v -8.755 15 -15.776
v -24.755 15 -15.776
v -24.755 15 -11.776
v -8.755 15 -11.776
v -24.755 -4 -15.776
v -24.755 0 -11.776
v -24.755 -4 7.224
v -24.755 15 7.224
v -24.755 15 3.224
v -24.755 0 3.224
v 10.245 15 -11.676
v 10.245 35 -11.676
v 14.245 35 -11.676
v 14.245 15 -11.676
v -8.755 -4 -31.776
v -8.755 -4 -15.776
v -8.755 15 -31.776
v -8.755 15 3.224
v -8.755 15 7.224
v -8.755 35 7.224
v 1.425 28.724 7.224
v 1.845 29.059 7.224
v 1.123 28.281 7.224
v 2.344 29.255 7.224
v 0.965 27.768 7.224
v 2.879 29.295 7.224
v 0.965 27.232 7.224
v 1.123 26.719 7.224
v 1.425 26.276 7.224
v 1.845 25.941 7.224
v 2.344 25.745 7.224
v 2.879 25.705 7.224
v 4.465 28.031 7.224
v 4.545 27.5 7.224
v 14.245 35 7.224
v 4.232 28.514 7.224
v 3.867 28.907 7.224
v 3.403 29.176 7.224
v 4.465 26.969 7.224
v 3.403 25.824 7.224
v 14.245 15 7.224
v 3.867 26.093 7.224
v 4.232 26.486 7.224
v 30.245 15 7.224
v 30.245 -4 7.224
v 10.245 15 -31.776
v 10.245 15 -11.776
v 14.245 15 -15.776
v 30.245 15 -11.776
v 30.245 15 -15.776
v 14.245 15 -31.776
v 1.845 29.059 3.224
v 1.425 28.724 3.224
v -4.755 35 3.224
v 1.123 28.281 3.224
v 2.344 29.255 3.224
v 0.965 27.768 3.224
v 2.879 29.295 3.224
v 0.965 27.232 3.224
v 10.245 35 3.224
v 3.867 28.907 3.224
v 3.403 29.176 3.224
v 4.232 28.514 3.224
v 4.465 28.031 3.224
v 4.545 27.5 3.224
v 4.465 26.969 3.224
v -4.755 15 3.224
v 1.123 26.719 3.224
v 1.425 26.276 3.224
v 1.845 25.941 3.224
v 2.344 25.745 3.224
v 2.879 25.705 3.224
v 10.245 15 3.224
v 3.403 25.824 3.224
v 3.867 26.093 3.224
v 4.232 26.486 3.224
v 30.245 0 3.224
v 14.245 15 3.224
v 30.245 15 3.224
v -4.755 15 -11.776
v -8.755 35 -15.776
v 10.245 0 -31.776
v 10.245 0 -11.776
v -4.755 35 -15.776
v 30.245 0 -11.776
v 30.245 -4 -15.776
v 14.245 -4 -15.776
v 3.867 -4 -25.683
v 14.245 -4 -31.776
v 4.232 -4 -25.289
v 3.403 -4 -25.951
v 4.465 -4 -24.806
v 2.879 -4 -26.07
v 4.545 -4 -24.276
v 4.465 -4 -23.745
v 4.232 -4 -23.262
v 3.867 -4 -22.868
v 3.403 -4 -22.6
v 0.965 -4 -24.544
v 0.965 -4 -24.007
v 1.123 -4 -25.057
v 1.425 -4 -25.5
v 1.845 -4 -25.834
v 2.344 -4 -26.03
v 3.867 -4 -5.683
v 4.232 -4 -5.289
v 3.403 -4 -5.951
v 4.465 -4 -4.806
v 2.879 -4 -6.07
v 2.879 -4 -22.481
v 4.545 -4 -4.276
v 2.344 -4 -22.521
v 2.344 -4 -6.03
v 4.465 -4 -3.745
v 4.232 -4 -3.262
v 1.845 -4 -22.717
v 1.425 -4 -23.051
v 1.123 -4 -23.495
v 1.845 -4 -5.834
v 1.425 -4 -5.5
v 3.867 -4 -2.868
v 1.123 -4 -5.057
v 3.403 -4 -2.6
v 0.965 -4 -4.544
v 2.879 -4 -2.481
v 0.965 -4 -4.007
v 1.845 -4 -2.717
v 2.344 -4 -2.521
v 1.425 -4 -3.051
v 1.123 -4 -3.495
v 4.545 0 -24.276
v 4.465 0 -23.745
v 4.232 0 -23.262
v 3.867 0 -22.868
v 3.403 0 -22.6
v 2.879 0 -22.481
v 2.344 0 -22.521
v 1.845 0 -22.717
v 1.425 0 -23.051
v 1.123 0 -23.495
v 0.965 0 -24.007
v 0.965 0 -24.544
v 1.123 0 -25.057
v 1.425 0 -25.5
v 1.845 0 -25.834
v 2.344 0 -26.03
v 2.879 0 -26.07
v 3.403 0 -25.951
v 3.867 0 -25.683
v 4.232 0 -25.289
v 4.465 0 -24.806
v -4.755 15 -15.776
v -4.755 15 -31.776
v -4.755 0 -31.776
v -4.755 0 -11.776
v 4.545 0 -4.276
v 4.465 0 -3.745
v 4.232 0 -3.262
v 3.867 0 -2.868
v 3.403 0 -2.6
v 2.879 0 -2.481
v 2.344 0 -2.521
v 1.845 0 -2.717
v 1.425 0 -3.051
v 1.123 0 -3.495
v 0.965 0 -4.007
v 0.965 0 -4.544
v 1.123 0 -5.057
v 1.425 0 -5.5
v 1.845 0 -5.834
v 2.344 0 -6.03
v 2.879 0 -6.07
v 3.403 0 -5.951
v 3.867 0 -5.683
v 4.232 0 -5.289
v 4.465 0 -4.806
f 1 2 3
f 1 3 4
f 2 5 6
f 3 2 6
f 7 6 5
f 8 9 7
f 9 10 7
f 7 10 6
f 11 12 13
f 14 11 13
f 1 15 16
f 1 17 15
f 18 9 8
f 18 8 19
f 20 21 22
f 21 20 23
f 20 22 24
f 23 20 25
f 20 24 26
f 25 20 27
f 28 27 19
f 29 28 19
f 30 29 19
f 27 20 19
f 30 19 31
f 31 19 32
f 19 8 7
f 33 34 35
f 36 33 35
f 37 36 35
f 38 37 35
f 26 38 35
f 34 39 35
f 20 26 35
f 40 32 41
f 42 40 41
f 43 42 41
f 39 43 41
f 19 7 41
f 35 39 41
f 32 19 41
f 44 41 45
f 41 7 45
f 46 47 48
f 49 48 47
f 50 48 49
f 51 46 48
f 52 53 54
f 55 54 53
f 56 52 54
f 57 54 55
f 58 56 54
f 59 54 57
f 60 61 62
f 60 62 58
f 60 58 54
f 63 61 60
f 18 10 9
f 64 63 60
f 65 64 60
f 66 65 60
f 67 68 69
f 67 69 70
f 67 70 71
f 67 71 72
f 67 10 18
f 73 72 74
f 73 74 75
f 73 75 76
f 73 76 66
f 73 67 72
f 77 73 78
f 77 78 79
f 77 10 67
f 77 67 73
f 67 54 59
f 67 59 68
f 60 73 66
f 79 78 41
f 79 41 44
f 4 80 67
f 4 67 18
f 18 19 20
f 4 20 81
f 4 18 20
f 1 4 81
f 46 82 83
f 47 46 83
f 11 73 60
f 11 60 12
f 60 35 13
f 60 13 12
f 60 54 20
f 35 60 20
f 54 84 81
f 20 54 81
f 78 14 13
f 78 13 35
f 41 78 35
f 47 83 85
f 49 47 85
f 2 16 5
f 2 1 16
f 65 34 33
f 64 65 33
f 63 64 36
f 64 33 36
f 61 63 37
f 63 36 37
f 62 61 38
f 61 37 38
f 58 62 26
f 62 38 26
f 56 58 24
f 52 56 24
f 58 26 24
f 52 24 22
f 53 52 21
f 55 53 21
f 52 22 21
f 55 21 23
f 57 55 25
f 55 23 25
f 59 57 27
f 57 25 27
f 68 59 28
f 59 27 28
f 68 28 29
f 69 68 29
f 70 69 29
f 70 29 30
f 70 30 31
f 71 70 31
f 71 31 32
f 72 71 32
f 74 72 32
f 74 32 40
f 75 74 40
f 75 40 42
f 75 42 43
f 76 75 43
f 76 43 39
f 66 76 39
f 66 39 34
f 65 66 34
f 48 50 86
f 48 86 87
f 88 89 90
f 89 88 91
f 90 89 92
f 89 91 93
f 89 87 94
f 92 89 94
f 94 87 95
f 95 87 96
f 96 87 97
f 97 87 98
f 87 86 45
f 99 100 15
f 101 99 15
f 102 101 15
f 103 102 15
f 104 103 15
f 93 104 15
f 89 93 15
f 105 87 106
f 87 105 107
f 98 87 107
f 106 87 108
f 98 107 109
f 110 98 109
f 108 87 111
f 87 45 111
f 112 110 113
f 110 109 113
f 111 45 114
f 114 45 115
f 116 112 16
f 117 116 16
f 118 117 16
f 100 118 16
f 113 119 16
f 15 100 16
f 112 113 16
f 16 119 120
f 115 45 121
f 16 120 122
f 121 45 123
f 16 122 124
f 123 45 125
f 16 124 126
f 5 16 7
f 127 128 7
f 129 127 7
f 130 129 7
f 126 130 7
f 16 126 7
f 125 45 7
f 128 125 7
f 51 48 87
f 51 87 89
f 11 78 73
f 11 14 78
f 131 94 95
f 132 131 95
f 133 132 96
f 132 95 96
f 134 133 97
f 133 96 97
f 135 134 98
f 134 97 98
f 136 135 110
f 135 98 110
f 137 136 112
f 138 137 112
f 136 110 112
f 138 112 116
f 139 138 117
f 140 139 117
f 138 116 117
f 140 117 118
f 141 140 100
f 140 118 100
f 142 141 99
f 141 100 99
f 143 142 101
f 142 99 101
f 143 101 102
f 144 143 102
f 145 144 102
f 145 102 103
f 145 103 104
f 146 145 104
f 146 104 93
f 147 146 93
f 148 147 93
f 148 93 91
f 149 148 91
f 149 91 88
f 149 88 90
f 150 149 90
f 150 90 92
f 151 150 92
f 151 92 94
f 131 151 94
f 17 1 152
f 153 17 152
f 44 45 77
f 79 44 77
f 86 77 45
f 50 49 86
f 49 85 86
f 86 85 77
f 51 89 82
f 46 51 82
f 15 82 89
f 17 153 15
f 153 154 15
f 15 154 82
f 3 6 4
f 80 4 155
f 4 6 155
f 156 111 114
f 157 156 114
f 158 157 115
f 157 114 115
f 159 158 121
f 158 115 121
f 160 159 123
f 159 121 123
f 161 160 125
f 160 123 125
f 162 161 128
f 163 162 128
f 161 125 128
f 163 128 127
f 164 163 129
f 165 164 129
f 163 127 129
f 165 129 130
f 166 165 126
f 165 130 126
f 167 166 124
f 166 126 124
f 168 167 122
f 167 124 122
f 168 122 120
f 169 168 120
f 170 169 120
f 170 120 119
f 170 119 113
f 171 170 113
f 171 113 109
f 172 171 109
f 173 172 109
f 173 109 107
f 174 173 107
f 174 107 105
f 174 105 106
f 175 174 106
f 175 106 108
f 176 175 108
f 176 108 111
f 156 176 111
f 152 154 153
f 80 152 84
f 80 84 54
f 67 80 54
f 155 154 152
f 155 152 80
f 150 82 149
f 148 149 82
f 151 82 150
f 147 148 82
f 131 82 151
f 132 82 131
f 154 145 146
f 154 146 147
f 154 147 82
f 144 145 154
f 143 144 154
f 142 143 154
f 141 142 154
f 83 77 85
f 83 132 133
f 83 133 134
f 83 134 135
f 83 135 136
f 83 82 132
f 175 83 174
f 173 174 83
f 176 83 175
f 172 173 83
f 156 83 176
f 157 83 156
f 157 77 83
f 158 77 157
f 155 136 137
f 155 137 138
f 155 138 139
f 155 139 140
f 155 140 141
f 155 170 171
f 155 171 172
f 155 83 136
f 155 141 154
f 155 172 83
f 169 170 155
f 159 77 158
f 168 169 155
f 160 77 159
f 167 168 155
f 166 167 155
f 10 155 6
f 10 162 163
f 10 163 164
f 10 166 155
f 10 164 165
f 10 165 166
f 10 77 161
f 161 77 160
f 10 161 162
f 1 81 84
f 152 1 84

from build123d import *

# Parameters (mm, degrees)
EXTRUDE_1_DEPTH     = 15
EXTRUDE_1_2_DEPTH   = 15
SKETCH_1_W          = 55
SKETCH_1_H          = 4
EXTRUDE_1_3_DEPTH   = 15
EXTRUDE_2_DEPTH     = 4
EXTRUDE_3_DEPTH     = 20
SKETCH_4_R          = 1.8
CUT_EXTRUDE_1_DEPTH = 20
SKETCH_5_R          = 1.8
CUT_EXTRUDE_2_DEPTH = 20


with BuildPart() as part:
    # 草图1 → 凸台-拉伸1 (new body)
    with BuildSketch(Plane(origin=(0, 0, 0), x_dir=(1, 0, 0), z_dir=(0, 1, 0))):
        Polygon((-24.755102041, 11.775510204), (-4.755102041, 11.775510204), (-4.755102041, 31.775510204), (-8.755102041, 31.775510204), (-8.755102041, 15.775510204), (-24.755102041, 15.775510204), align=None)
    extrude(amount=EXTRUDE_1_DEPTH)



with BuildPart() as body_2:
    # 草图1 → Extrude 1 2 (new body)
    with BuildSketch(Plane(origin=(0, 0, 0), x_dir=(1, 0, 0), z_dir=(0, 1, 0))):
        Polygon((30.244897959, 15.775510204), (14.244897959, 15.775510204), (14.244897959, 31.775510204), (10.244897959, 31.775510204), (10.244897959, 11.775510204), (12.244897959, 11.775510204), (30.244897959, 11.775510204), align=None)
    extrude(amount=EXTRUDE_1_2_DEPTH)


with BuildPart() as body_3:
    # 草图1 → Extrude 1 3 (new body)
    with BuildSketch(Plane(origin=(0, 0, 0), x_dir=(1, 0, 0), z_dir=(0, 1, 0))):
        with Locations((2.744897959, -5.224489796)):
            Rectangle(SKETCH_1_W, SKETCH_1_H)
    extrude(amount=EXTRUDE_1_3_DEPTH)


with BuildPart() as part_1:
    add(part.part)

    add(body_2.part)  # 凸台-拉伸2 merges body 2

    add(body_3.part)  # 凸台-拉伸2 merges body 3
    # 草图2 → 凸台-拉伸2 (add)
    with BuildSketch(Plane.XZ):
        Polygon((-8.755102041, -15.775510204), (-24.755102041, -15.775510204), (-24.755102041, 7.224489796), (30.244897959, 7.224489796), (30.244897959, -15.775510204), (14.244897959, -15.775510204), (14.244897959, -31.775510204), (-8.755102041, -31.775510204), align=None)
    extrude(amount=EXTRUDE_2_DEPTH)

    # 草图3 → 凸台-拉伸3 (add)
    with BuildSketch(Plane(origin=(0, 15, 0), x_dir=(1, 0, 0), z_dir=(0, 1, 0))):
        Polygon((-8.755102041, 15.775510204), (-4.755102041, 15.775510204), (-4.755102041, -3.224489796), (10.244897959, -3.224489796), (10.244897959, 11.675510204), (14.244897959, 11.675510204), (14.244897959, -7.224489796), (10.244897959, -7.224489796), (-4.755102041, -7.224489796), (-8.755102041, -7.224489796), align=None)
    extrude(amount=EXTRUDE_3_DEPTH)

    # 草图4 → 切除-拉伸1 (cut)
    with BuildSketch(Plane.XZ.offset(4)):
        with Locations((2.744897959, -24.275510204)):
            Circle(SKETCH_4_R)
        with Locations((2.744897959, -4.275510204)):
            Circle(SKETCH_4_R)
    extrude(amount=-CUT_EXTRUDE_1_DEPTH, mode=Mode.SUBTRACT)

    # 草图5 → 切除-拉伸2 (cut)
    with BuildSketch(Plane.XY.offset(7.224489796)):
        with Locations((2.744897959, 27.5)):
            Circle(SKETCH_5_R)
    extrude(amount=-CUT_EXTRUDE_2_DEPTH, mode=Mode.SUBTRACT)


solid = part_1.part
